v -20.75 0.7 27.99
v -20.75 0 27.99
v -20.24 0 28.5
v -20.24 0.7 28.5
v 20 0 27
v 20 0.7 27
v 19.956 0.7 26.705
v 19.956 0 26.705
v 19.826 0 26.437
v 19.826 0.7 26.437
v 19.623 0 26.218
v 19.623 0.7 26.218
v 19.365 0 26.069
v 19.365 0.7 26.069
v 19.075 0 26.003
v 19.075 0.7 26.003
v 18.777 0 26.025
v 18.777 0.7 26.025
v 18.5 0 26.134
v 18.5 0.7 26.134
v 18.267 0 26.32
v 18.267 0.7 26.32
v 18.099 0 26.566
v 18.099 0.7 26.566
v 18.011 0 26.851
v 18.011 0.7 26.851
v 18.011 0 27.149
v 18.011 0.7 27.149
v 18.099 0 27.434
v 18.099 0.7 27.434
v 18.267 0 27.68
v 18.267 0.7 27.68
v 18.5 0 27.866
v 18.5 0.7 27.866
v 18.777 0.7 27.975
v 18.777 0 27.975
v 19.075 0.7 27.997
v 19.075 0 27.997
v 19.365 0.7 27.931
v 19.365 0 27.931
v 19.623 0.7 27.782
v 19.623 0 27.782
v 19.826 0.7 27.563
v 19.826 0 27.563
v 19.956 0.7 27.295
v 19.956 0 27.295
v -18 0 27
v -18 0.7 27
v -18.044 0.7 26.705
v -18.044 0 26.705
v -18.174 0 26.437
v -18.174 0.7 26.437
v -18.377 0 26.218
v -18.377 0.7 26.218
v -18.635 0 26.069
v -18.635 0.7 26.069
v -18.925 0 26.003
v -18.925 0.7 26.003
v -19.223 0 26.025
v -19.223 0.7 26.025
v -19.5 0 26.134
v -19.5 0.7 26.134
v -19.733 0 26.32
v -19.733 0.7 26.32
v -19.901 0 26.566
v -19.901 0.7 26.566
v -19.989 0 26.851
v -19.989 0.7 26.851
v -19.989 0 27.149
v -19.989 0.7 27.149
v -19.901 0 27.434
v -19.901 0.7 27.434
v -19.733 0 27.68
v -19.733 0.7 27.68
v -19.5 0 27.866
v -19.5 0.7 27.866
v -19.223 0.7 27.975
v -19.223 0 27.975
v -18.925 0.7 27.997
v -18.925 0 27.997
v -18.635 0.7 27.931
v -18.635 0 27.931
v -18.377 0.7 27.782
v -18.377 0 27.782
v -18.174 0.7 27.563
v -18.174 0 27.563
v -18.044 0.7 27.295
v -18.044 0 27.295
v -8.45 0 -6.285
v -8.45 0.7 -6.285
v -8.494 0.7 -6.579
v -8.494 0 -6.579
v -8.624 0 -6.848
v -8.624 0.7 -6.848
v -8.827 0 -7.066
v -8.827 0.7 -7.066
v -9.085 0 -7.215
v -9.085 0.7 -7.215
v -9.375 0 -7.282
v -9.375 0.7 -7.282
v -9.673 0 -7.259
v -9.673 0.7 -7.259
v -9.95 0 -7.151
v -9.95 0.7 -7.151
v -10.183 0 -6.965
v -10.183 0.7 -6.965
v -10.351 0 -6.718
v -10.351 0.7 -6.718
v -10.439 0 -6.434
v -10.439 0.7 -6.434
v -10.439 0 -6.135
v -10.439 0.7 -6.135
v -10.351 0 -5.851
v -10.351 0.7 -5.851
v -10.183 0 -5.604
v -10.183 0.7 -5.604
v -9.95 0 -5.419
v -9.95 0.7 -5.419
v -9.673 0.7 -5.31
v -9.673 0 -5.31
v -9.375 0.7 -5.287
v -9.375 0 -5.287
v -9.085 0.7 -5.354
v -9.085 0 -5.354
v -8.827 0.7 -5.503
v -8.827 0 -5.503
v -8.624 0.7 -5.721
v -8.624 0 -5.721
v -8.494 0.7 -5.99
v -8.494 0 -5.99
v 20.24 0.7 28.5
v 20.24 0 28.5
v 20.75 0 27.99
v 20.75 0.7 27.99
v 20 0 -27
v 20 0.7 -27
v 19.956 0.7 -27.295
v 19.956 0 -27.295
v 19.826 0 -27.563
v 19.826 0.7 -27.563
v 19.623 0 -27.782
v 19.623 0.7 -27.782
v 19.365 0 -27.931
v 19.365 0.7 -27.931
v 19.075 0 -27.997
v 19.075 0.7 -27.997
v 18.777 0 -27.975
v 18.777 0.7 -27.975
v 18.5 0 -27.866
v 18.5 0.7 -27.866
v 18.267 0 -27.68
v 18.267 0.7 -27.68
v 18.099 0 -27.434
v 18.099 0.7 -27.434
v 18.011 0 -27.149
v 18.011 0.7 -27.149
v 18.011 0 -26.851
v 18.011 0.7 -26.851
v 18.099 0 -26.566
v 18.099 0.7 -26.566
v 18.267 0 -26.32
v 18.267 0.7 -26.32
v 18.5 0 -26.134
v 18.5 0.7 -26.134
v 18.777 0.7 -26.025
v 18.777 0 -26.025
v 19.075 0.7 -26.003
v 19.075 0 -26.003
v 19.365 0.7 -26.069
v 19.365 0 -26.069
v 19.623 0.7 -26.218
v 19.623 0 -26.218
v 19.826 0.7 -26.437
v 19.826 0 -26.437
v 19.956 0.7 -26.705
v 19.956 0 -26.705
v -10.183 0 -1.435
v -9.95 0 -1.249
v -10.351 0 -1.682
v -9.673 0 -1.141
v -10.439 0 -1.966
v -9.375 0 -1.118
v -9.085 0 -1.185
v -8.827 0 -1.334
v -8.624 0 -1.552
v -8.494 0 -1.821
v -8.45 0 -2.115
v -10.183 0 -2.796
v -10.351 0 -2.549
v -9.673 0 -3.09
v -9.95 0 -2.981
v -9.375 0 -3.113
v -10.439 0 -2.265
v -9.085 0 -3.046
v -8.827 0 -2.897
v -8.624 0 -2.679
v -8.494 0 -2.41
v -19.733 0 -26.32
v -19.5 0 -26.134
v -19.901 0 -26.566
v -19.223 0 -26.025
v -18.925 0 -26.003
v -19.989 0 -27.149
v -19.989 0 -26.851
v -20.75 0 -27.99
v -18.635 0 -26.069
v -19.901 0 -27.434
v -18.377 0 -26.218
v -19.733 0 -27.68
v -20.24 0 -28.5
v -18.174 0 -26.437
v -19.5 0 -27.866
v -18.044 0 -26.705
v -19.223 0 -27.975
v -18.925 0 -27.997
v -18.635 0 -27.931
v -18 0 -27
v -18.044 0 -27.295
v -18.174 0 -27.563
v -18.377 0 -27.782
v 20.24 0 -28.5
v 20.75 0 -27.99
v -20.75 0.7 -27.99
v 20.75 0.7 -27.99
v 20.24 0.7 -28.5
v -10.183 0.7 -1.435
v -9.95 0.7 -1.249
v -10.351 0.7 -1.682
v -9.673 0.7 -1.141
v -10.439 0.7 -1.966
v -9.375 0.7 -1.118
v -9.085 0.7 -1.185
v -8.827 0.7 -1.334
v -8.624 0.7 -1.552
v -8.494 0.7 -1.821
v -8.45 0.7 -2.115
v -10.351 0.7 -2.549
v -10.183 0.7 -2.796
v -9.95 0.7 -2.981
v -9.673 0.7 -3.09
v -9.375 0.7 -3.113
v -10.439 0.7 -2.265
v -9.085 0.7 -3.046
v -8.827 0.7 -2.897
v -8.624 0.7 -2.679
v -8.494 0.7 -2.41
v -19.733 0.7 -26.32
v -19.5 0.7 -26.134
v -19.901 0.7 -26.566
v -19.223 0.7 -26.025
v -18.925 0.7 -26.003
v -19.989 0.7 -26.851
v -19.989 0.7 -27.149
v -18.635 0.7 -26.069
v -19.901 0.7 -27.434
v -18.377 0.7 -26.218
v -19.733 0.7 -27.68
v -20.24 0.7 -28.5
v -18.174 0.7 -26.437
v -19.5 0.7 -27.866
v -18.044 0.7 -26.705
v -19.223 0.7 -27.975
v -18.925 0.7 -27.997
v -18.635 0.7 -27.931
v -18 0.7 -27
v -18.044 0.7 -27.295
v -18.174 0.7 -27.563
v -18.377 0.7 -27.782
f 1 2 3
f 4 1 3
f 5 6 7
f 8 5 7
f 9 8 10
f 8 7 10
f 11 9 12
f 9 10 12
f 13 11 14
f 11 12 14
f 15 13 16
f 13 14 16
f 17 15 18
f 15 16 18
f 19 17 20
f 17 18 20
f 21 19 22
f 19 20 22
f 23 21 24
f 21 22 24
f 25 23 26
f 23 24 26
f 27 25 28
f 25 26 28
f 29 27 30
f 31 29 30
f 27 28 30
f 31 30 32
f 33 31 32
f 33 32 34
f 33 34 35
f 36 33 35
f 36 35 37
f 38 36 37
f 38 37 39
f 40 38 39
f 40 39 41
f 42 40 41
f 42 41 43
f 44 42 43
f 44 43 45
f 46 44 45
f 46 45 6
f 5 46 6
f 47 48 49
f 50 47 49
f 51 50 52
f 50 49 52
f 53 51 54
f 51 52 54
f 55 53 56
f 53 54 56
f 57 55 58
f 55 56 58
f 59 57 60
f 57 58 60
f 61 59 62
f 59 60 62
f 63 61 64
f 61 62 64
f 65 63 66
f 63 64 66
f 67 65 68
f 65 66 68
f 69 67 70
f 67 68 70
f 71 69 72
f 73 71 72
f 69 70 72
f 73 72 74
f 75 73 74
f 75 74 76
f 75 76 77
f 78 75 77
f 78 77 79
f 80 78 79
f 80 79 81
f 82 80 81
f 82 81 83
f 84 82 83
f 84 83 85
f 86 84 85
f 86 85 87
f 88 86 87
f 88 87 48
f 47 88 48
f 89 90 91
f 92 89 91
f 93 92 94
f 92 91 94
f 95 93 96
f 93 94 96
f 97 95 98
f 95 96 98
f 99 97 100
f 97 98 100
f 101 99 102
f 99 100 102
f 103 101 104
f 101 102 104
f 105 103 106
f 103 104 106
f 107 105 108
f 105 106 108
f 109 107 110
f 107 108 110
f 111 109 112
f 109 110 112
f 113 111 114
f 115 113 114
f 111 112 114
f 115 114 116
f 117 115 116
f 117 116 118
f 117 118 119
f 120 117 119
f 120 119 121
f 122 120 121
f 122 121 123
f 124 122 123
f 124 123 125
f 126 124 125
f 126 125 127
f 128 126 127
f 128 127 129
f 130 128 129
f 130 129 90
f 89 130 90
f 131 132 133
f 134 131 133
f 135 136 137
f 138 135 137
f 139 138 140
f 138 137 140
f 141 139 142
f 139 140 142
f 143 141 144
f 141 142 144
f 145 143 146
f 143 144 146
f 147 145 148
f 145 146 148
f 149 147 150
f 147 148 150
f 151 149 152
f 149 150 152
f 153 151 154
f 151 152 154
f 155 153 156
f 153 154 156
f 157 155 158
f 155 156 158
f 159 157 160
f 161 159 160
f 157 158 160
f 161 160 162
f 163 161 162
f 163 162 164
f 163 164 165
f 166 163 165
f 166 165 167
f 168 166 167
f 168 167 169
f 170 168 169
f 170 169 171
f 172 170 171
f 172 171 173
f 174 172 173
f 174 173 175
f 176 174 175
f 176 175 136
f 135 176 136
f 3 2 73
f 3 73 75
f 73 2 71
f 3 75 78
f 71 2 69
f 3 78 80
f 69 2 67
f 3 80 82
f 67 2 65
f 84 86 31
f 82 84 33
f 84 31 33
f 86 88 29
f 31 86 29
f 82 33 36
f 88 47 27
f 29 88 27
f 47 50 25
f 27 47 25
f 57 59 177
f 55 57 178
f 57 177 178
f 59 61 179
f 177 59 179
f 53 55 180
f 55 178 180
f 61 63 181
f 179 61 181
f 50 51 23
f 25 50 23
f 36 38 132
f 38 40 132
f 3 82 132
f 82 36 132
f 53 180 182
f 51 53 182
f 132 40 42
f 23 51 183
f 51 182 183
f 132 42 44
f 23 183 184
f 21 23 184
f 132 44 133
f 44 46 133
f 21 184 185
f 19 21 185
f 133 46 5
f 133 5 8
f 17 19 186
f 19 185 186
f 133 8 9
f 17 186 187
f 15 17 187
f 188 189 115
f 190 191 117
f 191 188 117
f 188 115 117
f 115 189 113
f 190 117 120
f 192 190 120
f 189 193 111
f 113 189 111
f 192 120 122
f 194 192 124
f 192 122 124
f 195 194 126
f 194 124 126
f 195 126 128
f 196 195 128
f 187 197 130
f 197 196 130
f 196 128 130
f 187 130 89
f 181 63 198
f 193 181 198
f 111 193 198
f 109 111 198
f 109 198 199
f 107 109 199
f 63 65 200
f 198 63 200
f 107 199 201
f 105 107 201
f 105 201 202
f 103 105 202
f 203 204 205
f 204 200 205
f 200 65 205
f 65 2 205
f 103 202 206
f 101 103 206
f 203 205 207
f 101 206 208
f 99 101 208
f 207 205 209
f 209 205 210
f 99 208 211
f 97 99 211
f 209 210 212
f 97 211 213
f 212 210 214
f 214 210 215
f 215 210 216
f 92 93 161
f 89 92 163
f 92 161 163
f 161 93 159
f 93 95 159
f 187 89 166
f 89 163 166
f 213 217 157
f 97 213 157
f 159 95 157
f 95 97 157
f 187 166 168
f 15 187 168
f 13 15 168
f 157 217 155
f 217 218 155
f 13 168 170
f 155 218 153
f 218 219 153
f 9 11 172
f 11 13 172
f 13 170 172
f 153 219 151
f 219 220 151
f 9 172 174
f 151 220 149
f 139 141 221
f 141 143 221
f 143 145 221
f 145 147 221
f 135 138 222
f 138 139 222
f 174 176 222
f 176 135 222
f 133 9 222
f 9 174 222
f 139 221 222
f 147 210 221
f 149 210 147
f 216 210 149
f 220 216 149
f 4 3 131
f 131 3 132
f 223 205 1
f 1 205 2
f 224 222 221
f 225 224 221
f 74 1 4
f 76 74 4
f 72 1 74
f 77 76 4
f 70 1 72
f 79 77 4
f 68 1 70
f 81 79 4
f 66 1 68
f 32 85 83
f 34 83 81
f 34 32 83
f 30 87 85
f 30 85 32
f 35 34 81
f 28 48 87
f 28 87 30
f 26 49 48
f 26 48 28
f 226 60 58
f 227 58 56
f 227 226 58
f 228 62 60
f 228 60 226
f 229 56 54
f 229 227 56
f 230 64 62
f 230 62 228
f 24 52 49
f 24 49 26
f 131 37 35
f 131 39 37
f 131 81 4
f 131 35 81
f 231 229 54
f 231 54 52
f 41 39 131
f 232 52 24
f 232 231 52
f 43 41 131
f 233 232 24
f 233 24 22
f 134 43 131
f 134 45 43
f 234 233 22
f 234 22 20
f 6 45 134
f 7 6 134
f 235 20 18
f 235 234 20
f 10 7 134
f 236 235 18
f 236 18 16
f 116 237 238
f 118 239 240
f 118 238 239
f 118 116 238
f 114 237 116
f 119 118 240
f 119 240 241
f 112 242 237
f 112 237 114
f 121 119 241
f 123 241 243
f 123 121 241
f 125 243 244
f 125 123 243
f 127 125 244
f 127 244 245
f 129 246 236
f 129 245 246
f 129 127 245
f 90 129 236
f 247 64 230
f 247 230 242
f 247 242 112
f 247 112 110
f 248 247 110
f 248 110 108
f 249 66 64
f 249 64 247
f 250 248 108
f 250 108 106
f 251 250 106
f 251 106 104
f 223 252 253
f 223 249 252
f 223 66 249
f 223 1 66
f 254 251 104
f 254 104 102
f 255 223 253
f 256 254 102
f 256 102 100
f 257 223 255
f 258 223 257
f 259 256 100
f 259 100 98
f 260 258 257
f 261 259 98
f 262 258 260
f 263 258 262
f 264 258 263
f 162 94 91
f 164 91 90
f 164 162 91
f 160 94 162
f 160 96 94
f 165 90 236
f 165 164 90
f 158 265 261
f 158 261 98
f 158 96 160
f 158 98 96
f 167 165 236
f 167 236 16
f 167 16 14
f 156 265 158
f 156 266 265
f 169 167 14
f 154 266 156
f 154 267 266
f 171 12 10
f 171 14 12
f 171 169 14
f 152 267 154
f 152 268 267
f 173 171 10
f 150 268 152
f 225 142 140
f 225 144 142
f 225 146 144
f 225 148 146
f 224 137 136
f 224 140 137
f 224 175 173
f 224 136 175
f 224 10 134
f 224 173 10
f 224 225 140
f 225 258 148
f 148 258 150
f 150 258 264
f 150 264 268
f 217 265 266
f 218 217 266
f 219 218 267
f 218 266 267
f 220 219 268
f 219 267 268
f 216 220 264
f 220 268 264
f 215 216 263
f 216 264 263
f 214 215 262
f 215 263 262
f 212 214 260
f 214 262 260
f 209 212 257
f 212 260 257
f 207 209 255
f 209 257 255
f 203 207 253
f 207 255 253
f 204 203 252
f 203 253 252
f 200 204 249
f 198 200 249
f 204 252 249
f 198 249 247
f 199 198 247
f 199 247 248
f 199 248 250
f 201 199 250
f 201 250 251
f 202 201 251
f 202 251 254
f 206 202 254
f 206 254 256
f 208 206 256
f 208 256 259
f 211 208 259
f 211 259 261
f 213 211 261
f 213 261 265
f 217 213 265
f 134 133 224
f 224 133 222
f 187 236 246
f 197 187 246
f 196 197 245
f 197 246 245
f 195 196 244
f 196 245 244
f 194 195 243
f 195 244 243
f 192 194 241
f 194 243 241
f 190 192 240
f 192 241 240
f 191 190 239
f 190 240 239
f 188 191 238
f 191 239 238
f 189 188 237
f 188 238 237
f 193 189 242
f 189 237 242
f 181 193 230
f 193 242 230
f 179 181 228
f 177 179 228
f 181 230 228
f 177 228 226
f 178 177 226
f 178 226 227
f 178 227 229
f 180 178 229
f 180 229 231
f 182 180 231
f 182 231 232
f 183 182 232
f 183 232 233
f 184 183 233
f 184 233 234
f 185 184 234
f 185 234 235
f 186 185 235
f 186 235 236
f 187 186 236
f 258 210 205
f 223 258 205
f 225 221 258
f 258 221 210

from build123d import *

# Parameters (mm, degrees)
BOSS_EXTRUDE1_DEPTH = 0.7
SKETCH5_R           = 1
CUT_EXTRUDE3_DEPTH  = 5
SKETCH6_R           = 1
CUT_EXTRUDE4_DEPTH  = 6


with BuildPart() as part:
    # Sketch1 → Boss-Extrude1 (new body)
    with BuildSketch(Plane(origin=(0, 0, 0), x_dir=(1, 0, 0), z_dir=(0, 1, 0))):
        Polygon((20.240139403, -28.5), (20.75, -27.990139403), (20.75, 27.990139403), (20.240139403, 28.5), (-20.240139403, 28.5), (-20.75, 27.990139403), (-20.75, -27.990139403), (-20.240139403, -28.5), align=None)
    extrude(amount=BOSS_EXTRUDE1_DEPTH)

    # Sketch5 → Cut-Extrude3 (cut)
    with BuildSketch(Plane(origin=(0, 0.7, 0), x_dir=(1, 0, 0), z_dir=(0, 1, 0))):
        with Locations((-19, 27)):
            Circle(SKETCH5_R)
        with Locations((19, 27)):
            Circle(SKETCH5_R)
        with Locations((19, -27)):
            Circle(SKETCH5_R)
        with Locations((-19, -27)):
            Circle(SKETCH5_R)
    extrude(amount=-CUT_EXTRUDE3_DEPTH, mode=Mode.SUBTRACT)

    # Sketch6 → Cut-Extrude4 (cut)
    with BuildSketch(Plane(origin=(0, 0.7, 0), x_dir=(1, 0, 0), z_dir=(0, 1, 0))):
        with Locations((-9.45, 6.284530189)):
            Circle(SKETCH6_R)
        with Locations((-9.45, 2.115469811)):
            Circle(SKETCH6_R)
    extrude(amount=-CUT_EXTRUDE4_DEPTH, mode=Mode.SUBTRACT)


solid = part.part
